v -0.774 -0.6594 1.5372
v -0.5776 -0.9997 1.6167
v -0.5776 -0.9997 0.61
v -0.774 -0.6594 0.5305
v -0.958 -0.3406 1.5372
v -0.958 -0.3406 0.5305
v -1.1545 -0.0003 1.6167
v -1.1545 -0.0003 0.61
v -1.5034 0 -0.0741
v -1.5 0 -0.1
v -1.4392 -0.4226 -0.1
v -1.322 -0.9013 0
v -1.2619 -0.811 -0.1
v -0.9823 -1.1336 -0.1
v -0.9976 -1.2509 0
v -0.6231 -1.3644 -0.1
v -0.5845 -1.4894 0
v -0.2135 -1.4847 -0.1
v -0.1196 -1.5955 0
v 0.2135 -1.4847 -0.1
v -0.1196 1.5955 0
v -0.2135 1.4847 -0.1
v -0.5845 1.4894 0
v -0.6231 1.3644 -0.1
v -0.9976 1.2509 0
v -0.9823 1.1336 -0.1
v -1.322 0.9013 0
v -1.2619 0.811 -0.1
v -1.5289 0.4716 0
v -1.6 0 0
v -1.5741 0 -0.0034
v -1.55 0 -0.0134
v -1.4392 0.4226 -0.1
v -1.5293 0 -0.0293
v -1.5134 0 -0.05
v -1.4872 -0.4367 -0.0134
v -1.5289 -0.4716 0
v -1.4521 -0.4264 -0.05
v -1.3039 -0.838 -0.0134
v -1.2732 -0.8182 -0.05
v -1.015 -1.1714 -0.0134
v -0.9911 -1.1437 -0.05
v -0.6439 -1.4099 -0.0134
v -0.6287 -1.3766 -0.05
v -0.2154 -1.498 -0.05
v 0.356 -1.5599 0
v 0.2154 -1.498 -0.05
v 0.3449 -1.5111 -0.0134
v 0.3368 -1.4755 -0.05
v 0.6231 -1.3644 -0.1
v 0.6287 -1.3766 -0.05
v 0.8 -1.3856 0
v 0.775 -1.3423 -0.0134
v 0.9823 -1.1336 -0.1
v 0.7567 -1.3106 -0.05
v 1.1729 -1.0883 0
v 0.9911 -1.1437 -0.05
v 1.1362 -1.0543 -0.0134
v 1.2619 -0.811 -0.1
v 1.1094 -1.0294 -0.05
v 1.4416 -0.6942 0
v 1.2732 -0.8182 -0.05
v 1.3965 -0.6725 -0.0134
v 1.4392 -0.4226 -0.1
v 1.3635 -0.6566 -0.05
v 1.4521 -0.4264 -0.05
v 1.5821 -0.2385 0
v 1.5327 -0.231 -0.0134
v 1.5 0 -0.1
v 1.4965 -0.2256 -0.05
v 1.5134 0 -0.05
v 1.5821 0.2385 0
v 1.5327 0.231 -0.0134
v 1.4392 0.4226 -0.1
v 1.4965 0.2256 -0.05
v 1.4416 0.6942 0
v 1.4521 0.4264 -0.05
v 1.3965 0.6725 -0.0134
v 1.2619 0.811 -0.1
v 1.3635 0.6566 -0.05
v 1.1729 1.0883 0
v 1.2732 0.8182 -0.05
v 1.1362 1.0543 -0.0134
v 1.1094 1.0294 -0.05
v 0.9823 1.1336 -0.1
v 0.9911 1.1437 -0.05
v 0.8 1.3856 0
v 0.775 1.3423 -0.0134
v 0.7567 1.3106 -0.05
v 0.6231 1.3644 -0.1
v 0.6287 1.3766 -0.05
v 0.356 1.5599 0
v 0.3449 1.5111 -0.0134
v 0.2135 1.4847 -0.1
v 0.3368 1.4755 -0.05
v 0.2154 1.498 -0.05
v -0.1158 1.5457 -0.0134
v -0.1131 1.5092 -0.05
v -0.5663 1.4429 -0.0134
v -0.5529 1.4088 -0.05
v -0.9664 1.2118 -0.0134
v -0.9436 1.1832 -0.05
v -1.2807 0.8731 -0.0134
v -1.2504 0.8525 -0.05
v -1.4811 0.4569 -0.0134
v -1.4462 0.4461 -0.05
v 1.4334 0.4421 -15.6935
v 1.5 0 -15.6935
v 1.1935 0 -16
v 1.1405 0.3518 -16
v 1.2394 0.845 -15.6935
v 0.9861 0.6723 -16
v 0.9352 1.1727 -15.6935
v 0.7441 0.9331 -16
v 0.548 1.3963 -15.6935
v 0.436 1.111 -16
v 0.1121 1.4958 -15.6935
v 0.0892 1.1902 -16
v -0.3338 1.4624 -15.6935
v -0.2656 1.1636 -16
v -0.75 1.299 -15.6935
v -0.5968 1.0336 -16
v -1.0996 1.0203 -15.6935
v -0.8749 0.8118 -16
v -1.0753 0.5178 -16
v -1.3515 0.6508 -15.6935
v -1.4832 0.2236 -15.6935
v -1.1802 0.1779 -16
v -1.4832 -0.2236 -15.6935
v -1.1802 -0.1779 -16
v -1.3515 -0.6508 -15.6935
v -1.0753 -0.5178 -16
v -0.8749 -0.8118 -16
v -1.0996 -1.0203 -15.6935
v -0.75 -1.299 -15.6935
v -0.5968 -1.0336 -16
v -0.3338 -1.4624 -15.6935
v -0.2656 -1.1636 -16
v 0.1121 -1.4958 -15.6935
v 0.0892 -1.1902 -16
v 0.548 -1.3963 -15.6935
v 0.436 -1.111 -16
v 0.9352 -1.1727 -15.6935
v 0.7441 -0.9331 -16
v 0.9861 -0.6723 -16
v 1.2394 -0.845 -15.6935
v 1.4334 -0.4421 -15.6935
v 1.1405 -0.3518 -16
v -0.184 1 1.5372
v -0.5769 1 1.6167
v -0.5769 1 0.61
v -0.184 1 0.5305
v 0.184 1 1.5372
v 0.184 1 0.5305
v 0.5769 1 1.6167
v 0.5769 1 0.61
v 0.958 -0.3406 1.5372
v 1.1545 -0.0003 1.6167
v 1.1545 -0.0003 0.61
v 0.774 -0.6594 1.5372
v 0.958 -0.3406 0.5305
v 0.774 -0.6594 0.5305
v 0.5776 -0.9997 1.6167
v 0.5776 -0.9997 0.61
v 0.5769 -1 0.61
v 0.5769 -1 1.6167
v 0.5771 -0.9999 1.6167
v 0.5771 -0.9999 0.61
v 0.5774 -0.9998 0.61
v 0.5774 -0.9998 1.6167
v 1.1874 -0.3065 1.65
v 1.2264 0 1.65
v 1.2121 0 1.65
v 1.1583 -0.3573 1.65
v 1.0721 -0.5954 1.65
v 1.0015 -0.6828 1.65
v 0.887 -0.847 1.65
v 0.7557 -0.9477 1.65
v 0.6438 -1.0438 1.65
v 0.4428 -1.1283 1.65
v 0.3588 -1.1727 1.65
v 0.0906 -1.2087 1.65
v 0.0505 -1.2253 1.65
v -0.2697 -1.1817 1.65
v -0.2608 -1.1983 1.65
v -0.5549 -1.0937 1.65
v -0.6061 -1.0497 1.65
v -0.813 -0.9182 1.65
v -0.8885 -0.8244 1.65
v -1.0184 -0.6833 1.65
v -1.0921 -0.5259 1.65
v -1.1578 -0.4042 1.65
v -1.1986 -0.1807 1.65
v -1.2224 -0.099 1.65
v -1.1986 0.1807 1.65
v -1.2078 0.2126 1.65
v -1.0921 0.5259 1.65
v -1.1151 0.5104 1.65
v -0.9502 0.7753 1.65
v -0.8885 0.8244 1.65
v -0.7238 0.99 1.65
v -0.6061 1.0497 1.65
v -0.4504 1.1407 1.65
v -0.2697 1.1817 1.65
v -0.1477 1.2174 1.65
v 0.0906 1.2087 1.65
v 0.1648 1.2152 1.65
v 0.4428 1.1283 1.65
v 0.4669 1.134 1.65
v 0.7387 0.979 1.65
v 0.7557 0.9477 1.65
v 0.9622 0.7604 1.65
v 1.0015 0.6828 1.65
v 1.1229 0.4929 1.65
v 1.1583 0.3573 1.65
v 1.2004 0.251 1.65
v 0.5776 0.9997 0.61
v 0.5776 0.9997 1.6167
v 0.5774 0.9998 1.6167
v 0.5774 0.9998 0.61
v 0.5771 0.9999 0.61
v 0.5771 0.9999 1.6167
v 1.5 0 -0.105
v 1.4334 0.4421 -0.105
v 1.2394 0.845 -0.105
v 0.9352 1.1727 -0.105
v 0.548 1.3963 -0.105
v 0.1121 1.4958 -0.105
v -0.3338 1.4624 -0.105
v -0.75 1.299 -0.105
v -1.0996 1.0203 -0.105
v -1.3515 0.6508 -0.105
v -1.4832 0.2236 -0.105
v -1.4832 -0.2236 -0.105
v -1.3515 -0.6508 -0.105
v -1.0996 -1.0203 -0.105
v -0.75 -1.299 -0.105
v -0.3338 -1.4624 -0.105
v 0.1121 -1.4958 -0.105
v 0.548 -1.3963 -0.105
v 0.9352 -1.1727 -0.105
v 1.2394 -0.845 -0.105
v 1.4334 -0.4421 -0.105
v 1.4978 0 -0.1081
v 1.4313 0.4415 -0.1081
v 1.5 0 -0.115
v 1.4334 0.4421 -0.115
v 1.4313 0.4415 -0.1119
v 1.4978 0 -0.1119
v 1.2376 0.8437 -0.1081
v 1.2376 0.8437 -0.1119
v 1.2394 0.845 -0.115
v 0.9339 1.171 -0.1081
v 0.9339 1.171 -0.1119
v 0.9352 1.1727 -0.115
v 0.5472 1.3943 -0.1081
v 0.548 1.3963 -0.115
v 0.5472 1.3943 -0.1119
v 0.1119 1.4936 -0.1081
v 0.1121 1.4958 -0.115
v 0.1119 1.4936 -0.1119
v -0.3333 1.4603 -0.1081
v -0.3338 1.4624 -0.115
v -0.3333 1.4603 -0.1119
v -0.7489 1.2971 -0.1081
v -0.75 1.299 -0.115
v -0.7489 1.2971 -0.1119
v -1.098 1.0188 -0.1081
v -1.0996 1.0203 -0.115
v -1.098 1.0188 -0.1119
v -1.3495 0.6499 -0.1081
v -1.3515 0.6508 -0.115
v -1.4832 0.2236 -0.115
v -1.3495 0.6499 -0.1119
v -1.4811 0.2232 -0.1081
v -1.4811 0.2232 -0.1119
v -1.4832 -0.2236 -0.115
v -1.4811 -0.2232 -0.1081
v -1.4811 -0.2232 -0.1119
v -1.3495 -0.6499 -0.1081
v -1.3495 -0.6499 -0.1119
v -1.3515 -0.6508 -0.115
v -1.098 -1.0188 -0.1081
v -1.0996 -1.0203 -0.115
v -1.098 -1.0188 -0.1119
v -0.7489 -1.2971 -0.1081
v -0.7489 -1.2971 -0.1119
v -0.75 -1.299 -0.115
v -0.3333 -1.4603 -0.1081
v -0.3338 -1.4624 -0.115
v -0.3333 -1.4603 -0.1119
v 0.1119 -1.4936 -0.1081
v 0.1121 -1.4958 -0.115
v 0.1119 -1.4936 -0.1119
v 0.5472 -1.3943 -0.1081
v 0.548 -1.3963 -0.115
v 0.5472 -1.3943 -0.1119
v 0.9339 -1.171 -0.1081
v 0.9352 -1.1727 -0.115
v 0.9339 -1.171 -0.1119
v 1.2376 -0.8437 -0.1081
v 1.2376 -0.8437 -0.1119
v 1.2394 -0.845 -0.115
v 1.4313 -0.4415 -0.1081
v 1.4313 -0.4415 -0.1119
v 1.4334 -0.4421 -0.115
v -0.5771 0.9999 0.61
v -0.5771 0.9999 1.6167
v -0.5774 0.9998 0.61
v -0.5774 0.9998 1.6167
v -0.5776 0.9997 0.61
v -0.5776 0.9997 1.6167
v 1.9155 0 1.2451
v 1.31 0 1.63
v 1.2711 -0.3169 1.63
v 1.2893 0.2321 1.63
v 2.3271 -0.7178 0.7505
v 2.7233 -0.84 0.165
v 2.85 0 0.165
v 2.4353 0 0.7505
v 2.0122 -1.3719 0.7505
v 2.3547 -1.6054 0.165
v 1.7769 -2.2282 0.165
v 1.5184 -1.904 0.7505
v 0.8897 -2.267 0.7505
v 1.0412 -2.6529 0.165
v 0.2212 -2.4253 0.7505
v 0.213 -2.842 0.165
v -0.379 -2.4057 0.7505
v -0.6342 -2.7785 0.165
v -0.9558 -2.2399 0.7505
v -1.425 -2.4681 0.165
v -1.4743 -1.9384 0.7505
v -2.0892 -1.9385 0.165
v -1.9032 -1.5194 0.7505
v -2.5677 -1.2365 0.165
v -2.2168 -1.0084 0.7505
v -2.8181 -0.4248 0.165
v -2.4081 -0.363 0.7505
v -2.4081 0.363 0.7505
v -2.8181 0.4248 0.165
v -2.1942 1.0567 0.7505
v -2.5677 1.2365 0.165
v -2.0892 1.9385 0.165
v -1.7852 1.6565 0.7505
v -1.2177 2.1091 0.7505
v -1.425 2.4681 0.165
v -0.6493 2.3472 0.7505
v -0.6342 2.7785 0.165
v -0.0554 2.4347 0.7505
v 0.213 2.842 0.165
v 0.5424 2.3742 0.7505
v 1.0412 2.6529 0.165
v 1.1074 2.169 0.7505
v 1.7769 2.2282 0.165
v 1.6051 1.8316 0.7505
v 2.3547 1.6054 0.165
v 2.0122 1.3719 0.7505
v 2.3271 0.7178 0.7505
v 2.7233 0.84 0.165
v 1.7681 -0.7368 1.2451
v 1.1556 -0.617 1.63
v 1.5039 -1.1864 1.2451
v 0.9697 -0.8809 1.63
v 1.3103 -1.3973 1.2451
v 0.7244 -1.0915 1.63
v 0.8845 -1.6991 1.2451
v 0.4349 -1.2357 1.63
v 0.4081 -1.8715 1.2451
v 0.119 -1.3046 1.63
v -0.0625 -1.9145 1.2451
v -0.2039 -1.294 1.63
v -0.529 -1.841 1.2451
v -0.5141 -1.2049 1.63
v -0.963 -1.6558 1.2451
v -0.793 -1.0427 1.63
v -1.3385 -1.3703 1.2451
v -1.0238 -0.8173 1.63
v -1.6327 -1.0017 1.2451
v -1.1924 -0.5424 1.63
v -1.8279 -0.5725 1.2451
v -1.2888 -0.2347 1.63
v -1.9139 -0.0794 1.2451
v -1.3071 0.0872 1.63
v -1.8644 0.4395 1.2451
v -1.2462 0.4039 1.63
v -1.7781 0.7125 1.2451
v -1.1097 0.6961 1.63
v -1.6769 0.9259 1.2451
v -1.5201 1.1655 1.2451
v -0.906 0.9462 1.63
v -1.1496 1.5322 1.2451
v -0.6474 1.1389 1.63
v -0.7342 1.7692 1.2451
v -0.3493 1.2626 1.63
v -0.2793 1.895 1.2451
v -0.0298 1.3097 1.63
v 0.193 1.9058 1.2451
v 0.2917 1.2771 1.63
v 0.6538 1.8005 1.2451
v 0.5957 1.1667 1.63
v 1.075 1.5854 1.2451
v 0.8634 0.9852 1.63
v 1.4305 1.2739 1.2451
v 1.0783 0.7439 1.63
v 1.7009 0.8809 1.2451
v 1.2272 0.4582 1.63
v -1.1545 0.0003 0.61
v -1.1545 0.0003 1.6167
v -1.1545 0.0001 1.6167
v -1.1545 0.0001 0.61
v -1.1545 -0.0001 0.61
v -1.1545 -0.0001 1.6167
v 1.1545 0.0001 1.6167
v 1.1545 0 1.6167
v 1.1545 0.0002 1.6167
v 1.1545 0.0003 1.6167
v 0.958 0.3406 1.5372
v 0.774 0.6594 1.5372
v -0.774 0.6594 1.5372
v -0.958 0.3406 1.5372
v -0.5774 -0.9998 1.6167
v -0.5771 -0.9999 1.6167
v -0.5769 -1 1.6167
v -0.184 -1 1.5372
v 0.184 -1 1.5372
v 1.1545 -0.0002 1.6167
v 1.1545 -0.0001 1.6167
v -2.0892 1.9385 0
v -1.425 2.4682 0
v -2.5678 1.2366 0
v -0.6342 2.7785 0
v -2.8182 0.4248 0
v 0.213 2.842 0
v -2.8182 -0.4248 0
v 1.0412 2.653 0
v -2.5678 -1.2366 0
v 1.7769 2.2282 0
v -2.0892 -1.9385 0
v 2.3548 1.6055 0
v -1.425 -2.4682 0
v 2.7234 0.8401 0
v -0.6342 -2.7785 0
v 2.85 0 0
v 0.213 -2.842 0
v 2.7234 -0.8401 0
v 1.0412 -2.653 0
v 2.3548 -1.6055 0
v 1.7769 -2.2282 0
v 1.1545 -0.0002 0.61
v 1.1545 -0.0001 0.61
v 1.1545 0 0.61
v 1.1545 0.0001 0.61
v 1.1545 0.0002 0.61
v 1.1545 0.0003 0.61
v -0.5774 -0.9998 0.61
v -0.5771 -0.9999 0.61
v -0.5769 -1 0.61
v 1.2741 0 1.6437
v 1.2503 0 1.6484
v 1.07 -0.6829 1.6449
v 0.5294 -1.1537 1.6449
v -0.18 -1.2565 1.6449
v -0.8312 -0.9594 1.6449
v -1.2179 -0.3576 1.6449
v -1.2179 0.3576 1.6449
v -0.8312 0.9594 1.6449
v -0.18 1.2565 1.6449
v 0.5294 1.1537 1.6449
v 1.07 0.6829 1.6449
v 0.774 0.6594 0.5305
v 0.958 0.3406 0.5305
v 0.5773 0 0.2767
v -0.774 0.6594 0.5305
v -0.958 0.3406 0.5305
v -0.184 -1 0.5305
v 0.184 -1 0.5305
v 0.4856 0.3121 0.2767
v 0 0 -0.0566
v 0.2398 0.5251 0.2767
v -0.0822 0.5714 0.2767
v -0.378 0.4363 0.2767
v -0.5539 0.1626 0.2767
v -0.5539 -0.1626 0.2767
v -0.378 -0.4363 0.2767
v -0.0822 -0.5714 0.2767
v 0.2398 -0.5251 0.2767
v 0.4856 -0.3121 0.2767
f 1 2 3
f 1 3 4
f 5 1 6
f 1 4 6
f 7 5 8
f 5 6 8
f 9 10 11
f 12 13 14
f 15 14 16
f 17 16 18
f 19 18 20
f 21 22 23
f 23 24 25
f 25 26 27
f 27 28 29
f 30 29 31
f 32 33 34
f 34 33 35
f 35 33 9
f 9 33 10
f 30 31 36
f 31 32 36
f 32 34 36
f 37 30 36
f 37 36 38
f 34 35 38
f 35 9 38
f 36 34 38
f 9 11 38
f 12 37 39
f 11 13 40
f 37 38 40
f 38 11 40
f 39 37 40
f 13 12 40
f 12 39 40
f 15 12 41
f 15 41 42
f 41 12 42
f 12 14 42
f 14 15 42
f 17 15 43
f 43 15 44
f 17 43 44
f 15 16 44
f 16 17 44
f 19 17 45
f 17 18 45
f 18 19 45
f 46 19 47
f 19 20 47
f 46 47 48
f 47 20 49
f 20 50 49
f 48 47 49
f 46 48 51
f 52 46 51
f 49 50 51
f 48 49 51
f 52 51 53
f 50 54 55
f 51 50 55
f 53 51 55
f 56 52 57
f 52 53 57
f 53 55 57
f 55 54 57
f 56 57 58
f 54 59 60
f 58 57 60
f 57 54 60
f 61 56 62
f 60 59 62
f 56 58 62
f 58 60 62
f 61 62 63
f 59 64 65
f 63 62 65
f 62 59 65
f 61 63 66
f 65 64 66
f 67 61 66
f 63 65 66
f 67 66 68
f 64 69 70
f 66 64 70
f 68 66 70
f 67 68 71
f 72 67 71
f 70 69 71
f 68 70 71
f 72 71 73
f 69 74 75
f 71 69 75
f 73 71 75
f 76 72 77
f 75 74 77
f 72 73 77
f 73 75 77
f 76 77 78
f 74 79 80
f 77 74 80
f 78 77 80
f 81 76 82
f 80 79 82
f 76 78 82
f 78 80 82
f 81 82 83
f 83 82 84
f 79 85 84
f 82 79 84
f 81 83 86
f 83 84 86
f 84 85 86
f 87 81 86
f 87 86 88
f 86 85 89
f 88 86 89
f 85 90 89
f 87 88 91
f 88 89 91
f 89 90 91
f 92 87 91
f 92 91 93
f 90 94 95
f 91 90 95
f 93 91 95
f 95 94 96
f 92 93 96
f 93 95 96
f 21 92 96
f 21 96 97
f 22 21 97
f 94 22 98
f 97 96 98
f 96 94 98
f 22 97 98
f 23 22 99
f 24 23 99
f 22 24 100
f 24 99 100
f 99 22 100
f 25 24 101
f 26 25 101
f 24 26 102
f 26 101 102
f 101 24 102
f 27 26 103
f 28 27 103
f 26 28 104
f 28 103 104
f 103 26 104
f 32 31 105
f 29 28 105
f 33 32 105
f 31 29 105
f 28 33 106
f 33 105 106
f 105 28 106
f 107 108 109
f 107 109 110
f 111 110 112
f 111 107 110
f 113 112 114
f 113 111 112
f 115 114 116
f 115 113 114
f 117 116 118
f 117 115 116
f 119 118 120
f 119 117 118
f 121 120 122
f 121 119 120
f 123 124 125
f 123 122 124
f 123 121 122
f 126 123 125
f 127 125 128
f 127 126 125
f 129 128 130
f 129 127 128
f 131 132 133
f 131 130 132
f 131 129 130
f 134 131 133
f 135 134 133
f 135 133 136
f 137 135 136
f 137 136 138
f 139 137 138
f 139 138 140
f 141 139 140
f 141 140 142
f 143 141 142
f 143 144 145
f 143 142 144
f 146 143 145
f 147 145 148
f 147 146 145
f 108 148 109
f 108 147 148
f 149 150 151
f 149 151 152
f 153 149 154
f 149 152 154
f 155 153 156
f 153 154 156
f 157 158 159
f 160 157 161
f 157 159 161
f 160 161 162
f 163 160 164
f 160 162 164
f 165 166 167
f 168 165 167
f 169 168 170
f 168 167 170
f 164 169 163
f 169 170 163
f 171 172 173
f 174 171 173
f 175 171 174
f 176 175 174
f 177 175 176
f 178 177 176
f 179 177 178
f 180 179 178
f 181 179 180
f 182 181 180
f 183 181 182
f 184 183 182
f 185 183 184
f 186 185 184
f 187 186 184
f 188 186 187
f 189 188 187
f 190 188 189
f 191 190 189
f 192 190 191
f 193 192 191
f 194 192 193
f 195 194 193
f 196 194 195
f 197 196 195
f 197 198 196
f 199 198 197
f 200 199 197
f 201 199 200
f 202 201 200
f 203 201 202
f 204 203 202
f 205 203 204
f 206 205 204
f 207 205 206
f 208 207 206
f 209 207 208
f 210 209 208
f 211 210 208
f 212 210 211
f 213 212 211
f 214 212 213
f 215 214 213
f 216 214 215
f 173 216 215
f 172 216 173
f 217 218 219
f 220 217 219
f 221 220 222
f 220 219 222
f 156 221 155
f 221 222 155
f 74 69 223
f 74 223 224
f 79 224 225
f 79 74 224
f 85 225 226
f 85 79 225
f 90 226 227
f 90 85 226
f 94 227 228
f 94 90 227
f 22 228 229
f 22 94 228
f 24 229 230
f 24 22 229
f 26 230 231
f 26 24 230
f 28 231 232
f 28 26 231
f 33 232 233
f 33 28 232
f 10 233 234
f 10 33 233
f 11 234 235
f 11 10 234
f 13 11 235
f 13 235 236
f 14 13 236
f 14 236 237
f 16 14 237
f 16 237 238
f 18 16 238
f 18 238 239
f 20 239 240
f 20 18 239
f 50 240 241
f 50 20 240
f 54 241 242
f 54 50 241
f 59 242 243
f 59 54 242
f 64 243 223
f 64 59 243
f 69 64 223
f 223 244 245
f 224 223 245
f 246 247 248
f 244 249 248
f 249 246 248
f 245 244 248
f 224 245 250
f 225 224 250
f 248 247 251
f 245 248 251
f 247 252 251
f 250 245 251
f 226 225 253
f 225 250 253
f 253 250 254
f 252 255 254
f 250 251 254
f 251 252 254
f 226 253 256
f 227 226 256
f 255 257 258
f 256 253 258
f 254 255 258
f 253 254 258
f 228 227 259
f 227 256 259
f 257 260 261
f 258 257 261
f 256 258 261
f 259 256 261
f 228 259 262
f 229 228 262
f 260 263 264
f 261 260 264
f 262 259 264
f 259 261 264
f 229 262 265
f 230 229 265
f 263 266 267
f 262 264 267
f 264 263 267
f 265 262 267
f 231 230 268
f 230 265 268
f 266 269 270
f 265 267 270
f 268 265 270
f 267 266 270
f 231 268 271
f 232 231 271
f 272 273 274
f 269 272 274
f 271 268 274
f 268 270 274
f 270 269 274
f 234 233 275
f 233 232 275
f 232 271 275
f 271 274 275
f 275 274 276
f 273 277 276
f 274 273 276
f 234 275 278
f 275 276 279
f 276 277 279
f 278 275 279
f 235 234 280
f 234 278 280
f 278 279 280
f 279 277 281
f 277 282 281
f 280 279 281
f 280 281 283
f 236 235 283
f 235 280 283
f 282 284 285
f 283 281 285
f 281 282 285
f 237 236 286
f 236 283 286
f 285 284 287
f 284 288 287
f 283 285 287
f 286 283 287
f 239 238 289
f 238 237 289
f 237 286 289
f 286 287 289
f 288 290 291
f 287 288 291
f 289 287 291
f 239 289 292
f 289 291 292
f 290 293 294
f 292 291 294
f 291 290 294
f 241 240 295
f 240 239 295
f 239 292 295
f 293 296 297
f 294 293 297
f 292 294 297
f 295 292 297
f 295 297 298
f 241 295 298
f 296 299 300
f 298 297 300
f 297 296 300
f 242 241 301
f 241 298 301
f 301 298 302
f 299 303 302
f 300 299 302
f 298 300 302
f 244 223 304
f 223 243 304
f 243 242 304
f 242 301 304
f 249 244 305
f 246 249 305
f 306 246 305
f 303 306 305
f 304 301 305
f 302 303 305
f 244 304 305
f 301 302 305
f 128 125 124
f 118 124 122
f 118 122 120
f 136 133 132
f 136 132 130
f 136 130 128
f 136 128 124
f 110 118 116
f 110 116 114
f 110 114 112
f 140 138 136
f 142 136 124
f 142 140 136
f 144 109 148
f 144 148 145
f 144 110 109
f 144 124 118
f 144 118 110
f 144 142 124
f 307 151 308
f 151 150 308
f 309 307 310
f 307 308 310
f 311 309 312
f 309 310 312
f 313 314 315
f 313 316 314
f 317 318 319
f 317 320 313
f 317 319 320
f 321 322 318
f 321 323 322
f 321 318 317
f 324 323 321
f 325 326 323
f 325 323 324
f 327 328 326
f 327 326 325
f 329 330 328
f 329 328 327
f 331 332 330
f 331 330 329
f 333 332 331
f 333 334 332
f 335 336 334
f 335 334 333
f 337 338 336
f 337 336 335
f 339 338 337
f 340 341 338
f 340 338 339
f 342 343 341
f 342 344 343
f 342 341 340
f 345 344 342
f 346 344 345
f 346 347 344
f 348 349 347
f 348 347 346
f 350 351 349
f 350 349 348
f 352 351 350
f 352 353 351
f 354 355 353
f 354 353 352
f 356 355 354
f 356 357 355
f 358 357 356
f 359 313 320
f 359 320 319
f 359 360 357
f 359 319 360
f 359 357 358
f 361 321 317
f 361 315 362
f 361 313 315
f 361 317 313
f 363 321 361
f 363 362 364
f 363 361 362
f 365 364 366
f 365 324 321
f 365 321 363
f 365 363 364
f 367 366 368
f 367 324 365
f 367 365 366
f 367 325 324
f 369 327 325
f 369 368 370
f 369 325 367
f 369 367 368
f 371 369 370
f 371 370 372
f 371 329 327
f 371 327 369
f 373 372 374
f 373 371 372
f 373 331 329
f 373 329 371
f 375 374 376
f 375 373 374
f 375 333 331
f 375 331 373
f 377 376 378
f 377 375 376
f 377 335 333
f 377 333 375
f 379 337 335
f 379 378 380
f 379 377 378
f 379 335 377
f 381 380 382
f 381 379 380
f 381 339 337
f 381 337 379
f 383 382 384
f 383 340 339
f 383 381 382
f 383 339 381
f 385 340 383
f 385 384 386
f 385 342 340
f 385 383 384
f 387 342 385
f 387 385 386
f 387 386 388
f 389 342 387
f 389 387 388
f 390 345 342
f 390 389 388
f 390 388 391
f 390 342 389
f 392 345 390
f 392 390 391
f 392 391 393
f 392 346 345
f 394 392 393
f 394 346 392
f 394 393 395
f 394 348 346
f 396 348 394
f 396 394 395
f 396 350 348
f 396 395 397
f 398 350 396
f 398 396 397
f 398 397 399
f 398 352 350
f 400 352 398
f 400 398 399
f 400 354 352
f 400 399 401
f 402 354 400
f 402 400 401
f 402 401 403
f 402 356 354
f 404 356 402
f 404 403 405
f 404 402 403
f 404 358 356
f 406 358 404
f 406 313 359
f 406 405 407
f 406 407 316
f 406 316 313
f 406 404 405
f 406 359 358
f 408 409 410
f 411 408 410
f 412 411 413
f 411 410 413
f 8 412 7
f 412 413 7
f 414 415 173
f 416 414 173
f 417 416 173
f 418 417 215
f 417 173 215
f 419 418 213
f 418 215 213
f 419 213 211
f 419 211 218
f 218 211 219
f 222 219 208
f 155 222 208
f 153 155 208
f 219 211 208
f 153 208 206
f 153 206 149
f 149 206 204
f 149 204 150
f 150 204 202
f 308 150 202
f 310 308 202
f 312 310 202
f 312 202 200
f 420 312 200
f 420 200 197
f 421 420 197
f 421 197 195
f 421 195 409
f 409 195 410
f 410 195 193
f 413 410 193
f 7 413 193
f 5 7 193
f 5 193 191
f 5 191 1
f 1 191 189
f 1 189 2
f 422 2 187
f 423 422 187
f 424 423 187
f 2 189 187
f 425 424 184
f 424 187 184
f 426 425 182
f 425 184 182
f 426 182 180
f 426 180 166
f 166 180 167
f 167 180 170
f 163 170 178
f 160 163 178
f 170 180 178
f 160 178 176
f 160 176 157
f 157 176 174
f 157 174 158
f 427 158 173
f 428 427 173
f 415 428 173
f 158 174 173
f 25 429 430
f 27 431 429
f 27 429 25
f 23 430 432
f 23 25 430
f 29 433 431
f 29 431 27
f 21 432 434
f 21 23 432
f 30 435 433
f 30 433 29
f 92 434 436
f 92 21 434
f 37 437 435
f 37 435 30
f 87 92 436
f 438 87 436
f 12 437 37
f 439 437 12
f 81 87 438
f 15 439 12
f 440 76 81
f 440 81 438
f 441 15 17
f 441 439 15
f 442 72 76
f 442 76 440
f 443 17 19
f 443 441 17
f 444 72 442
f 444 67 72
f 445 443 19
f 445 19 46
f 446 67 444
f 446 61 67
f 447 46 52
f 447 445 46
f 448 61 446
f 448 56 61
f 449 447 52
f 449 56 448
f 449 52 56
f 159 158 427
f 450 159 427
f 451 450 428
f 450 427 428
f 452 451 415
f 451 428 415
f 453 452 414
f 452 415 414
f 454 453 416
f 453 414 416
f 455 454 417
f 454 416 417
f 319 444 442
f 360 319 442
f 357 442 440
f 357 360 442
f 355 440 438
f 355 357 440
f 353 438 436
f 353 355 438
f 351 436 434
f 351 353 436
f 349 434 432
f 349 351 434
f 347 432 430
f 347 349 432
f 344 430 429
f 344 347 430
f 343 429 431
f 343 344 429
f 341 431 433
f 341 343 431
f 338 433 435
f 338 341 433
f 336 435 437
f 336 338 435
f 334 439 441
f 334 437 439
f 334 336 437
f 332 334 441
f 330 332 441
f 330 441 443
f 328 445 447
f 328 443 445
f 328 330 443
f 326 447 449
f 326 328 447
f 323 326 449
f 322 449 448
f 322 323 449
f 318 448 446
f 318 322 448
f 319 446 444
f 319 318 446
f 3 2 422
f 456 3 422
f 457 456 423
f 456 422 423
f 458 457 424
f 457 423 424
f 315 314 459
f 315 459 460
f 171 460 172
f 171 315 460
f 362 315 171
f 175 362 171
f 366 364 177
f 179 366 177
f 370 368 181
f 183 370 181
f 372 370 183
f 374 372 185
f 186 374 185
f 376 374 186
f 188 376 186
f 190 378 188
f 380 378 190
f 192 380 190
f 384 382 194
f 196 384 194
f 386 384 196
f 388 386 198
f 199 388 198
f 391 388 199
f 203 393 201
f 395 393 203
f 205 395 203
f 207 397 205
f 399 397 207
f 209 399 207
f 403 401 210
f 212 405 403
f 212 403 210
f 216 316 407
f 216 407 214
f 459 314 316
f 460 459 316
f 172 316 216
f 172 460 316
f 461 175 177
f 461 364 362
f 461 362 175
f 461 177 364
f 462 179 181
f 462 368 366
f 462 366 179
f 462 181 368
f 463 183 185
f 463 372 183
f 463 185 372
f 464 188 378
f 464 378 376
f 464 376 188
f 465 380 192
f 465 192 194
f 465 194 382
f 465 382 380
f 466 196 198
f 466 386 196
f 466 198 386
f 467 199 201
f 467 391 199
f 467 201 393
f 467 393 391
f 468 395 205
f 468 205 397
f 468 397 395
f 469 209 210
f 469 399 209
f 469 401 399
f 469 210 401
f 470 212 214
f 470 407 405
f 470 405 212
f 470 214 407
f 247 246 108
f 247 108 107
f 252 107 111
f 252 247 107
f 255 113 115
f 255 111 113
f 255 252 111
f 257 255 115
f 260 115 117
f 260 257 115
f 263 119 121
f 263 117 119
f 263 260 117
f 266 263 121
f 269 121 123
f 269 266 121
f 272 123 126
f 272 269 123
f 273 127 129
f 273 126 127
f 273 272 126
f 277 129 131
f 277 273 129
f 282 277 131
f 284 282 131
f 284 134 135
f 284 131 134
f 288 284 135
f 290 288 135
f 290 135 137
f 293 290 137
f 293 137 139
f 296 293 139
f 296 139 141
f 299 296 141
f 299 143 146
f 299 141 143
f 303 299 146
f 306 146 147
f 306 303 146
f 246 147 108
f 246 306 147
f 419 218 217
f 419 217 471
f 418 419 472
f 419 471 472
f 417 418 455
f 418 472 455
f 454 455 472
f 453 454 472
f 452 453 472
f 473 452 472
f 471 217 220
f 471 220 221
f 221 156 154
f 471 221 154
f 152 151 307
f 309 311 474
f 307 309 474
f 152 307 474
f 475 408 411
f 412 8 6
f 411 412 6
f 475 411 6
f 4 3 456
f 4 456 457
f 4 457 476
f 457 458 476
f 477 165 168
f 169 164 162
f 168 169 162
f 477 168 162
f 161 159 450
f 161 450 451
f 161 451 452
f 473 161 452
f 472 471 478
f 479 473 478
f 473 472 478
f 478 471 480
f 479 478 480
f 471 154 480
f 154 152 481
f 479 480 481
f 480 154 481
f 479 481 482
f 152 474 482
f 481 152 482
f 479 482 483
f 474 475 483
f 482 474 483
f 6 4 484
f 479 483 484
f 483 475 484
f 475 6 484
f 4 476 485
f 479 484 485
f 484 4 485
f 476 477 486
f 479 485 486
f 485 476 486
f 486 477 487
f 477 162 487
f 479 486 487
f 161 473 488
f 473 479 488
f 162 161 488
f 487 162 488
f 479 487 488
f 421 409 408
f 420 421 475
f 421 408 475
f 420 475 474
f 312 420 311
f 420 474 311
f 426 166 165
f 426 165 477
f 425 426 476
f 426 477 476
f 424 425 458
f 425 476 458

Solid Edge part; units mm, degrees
sketch "Sketch1" plane through (0, 0, 0) normal (0, -1, 0) x (1, 0, 0)
  line L0 (0, -16) -> (1.5, -16)
  line L1 (1.5, -16) -> (1.5, -0.115)
  arc A0 (1.5, -0.105) -> (1.5, -0.115) centre (1.5038, -0.11) ccw
  line L2 (1.5, -0.105) -> (1.5, 0)
  line L3 (1.5, 0) -> (2.85, 0)
  line L4 (2.85, 0) -> (2.85, 0.165)
  arc A1 (1.27, 1.65) -> (2.85, 0.165) centre (-0.3628, -1.6703) cw
  line L5 (0, 1.65) -> (1.27, 1.65)
  dimension "D1" = 15.885
  dimension "D2" = 1.5
  dimension "D3" = 1.27
  dimension "D4" = 2.85
  dimension "D5" = 0.165
  dimension "D6" = 1.65
  dimension "D7" = 3.7
  dimension "D8" = 16
  dimension "D9" = 0.01
  dimension "D10" = 0.0025
revolve "RevolvedProtrusion1" add sketch "Sketch1" angle 360 about axis through (0, 0, 5) along (0, 0, -1)
sketch "Sketch2" plane through (0, 0, 0) normal (0, -1, 0) x (1, 0, 0)
  line L0 (0, -0.0566) -> (1.1545, 0.61)
  line L1 (1.1545, 0.61) -> (1.1545, 1.65)
  line L2 (1.1545, 1.65) -> (0, 1.65)
  dimension "D1" = 1.1545
  dimension "D2" = 1.04
revolve "RevolvedCutout1" cut sketch "Sketch2" angle 360 about axis through (0, 0, 5.3) along (0, 0, -1)
sketch "Sketch3" plane through (0, 0, 0) normal (0, 0, -1) x (0, 1, 0)
  arc A0 (-1, 0.577) -> (-1, -0.577) centre (0, 0) ccw
  line L0 (-1, 0.577) -> (-1, -0.577)
  dimension "D1" = 1
extrude "Protrusion1" add sketch "Sketch3" against normal blind 1.65
pattern_circular "Pattern1" count 6 over 360 about axis through (0, 0, 0) along (0, 0, -1) of "Protrusion1"
fillet "Round_1" radius 0.185 1 edges at (-1.27, 0, 1.65)
sketch "Sketch4" plane through (0, 0, 0) normal (0, -1, 0) x (1, 0, 0)
  line L0 (0, 0.9501) -> (1.2122, 1.65)
  line L1 (1.2122, 1.65) -> (0, 1.65)
  dimension "D1" = 1.2122
revolve "RevolvedCutout2" cut sketch "Sketch4" angle 360 about axis through (0, 0, 5.3) along (0, 0, -1)
sketch "Sketch5" plane through (0, 0, 0) normal (0, -1, 0) x (1, 0, 0)
  line L0 (-1.5, 0) -> (-1.5, -0.1)
  line L1 (-1.6, 0) -> (-1.5, 0)
  arc A0 (-1.6, 0) -> (-1.5, -0.1) centre (-1.6, -0.1) cw
  dimension "D1" = 1.5
  dimension "D2" = 0.1
revolve "RevolvedProtrusion2" add sketch "Sketch5" angle 360 about axis through (0, 0, -0.5) along (0, 0, 1)
cosmetic_thread "Thread1" size "M3"
chamfer "Chamfer1" distance 0.3065 angle 45 1 edges at (-1.5, 0, -16)
properties material "Stahl"
